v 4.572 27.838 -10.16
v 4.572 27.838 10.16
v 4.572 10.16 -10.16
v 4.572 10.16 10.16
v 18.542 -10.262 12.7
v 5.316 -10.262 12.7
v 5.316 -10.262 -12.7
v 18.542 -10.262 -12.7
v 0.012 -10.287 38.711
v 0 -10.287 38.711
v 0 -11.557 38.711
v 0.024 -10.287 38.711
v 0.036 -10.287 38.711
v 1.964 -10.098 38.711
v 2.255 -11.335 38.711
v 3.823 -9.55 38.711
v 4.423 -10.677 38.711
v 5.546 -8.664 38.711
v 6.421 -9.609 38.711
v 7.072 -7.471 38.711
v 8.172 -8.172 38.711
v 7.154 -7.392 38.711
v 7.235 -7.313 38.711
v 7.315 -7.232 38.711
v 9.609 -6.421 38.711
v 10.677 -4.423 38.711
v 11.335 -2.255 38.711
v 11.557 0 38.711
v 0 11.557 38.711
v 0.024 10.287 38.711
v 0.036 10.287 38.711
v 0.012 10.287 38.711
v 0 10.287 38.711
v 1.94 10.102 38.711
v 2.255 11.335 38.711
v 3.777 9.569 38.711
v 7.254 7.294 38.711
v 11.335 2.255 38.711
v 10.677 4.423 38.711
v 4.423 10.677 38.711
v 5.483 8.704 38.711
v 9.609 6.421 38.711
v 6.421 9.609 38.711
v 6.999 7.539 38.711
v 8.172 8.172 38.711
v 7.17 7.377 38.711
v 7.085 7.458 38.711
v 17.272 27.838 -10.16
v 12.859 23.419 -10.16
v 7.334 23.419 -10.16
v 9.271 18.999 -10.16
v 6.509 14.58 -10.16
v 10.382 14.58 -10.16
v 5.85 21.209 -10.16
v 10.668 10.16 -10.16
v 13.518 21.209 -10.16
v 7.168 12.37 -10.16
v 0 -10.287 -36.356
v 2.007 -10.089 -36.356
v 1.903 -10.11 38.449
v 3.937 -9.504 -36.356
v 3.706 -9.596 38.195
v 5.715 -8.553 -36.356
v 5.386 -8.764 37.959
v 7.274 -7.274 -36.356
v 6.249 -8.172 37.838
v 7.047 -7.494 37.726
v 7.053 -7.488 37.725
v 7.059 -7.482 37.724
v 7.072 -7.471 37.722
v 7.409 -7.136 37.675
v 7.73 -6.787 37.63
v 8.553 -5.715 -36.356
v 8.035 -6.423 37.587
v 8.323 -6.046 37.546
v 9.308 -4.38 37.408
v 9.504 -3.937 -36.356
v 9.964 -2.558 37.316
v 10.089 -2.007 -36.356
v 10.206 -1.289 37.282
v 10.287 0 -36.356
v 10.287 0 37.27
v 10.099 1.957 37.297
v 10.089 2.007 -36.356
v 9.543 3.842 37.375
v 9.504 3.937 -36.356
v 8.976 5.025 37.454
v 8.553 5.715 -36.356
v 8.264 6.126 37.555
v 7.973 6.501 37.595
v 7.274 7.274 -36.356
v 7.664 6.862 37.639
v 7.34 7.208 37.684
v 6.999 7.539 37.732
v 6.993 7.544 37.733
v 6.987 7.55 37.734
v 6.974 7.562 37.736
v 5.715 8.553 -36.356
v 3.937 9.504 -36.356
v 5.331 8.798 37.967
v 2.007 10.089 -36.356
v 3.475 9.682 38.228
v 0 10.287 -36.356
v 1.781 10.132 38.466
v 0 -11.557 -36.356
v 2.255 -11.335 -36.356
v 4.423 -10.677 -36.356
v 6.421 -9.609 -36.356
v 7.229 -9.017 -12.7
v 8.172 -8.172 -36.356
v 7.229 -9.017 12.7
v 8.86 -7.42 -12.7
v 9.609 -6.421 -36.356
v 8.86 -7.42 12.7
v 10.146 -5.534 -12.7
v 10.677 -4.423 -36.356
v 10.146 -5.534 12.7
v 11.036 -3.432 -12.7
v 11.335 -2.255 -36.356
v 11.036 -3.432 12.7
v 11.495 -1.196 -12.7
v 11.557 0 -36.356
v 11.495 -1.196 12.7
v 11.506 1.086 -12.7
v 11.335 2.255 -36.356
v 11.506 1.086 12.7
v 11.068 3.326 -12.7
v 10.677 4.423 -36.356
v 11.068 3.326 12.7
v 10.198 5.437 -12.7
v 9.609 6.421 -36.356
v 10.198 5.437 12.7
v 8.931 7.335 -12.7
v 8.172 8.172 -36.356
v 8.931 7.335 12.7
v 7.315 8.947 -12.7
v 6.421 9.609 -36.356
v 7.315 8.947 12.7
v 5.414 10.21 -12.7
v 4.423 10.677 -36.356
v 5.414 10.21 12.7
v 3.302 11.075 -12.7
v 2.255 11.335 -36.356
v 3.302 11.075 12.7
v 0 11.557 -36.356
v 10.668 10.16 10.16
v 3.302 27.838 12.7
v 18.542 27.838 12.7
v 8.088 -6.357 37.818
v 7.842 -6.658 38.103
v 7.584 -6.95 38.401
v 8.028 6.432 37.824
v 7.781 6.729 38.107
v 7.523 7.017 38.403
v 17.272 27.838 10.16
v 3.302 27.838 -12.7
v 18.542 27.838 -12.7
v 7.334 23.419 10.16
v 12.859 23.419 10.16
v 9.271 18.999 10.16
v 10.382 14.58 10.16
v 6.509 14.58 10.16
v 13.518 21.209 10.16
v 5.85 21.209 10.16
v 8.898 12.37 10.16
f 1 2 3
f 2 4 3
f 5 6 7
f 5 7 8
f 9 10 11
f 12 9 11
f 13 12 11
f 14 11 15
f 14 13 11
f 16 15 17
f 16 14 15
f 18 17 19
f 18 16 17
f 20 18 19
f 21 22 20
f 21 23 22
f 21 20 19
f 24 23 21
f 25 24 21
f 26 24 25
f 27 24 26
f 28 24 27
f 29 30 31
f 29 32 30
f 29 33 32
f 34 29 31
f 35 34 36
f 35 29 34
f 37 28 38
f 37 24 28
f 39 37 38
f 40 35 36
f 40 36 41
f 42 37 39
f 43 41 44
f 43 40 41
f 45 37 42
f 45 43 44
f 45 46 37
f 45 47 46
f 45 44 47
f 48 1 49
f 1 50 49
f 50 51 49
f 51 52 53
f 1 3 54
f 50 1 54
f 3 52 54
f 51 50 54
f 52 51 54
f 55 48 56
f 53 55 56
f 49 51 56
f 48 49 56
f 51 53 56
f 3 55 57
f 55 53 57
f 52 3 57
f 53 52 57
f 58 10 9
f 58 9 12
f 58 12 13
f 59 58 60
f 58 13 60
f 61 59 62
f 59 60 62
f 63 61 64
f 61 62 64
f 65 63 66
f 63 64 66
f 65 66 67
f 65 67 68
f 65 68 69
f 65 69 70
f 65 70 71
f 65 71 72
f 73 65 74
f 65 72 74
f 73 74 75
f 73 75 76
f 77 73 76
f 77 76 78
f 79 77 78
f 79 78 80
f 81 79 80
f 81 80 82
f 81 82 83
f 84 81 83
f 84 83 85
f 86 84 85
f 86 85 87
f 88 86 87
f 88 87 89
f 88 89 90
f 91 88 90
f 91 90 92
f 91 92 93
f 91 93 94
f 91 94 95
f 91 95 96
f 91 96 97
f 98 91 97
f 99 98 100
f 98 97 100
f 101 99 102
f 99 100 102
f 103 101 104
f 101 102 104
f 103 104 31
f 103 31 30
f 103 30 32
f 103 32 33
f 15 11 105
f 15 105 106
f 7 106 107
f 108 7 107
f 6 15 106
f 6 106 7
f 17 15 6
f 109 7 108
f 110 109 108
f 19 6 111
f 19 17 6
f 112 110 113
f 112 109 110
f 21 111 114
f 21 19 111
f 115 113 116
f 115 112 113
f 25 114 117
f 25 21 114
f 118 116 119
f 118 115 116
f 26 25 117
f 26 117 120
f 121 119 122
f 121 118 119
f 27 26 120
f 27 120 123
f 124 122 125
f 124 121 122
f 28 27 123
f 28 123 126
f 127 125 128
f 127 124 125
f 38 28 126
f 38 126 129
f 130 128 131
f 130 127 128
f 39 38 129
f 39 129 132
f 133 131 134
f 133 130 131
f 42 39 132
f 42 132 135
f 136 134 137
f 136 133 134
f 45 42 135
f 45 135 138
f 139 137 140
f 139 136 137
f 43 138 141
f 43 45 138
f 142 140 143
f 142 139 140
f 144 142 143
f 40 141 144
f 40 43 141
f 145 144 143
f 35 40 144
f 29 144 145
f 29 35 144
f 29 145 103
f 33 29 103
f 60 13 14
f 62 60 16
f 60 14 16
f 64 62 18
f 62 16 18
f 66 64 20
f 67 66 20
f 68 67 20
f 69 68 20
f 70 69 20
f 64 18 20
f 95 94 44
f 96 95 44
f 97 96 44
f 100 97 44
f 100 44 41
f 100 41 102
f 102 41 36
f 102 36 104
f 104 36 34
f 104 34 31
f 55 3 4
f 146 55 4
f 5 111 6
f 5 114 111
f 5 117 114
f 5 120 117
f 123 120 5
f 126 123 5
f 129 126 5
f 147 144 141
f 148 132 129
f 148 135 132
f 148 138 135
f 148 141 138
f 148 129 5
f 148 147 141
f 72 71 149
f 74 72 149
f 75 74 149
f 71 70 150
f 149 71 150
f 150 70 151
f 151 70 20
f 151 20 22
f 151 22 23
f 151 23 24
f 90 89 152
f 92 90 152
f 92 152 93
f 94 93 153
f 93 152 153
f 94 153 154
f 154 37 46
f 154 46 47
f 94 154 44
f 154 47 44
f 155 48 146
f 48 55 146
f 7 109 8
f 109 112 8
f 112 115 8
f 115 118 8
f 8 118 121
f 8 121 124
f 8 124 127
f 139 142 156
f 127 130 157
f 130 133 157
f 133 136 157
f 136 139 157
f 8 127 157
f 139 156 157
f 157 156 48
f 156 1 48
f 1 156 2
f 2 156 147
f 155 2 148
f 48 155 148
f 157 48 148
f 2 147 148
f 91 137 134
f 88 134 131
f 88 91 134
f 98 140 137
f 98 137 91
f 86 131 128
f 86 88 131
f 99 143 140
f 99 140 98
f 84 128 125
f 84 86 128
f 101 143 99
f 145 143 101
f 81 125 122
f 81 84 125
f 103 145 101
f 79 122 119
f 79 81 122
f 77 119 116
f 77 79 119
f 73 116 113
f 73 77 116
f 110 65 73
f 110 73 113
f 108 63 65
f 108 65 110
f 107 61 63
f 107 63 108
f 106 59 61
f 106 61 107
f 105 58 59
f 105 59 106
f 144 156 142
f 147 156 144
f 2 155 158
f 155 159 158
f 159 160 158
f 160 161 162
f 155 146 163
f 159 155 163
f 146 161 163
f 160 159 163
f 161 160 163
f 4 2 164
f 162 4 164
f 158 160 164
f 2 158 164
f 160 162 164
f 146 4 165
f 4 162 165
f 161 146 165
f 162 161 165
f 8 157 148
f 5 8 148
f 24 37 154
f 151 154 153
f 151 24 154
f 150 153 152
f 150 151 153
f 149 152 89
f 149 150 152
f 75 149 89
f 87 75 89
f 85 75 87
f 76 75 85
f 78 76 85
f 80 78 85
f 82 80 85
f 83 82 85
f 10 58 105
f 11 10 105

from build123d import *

# Parameters (mm, degrees)
F1_DEPTH     = 37.95141
F3_DEPTH     = 0.75946
F4_T4_DEPTH  = 76.9415838332
F4_S5_R      = 10.287
F4_T6_DEPTH  = 40
F5_W         = 23.114
F5_H         = 1.59512
F6_DEPTH     = 25.4
F9_DEPTH     = 25.4
F10_T4_DEPTH = 21.5531370707
F10_S5_R     = 10.287
F10_T6_DEPTH = 12
F14_W        = 15.24
F14_H        = 25.4
F14_W_2      = 12.7
F14_H_2      = 20.32
F15_DEPTH    = 38.1
F12_W        = 6.096
F12_H        = 20.32
F17_DEPTH    = 25.4


# Not quite as in the source:
# - a fillet or chamfer that OpenCascade refuses, or shapes differently, is made with other operations: its cross-section is extruded or revolved along the edge and cut away or added


with BuildPart() as f1:
    # F0 (on Top) → F1 (new body, symmetric)
    with BuildSketch(Plane.XY):
        with BuildLine():
            ThreePointArc((0, 10.287), (10.287, 0), (0, -10.287))
            Line((0, -10.287), (0, -11.557))
            ThreePointArc((0, -11.557), (11.557, 0), (0, 11.557))
            Line((0, 11.557), (0, 10.287))
        make_face()
    extrude(amount=F1_DEPTH, both=True)

    # F2 (on face) → F3 (join, symmetric)
    with BuildSketch(Plane.XY.offset(37.95141)):
        with BuildLine():
            Line((0, 11.557), (0, -11.557))
            ThreePointArc((0, -11.557), (11.557, 0), (0, 11.557))
        make_face()
    extrude(amount=F3_DEPTH, both=True)

    # F4: chamfer of 1.524 x 10.8438234569 on 1 edges, made by hand


with BuildPart() as f4_tool2:
    # F4_s3 → F4_t4 (new body)
    with BuildSketch(Plane.XZ.offset(-38.4707919166)):
        Polygon((0, 38.71595), (10.8438234569, 37.19195), (0, 37.19195), align=None)
    extrude(amount=F4_T4_DEPTH)

    # F4_s5 → F4_t6 (intersect, symmetric)
    with BuildSketch(Plane.XY.offset(38)):
        Circle(F4_S5_R)
    extrude(amount=F4_T6_DEPTH, both=True, mode=Mode.INTERSECT)


with BuildPart() as f1_1:
    add(f1.part)

    # F4_t1: cut F4_tool2
    add(f4_tool2.part, mode=Mode.SUBTRACT)

    # F5 (on face) → F6 (cut)
    with BuildSketch(Plane(origin=(0, 0, 0), x_dir=(0, -1, 0), z_dir=(-1, 0, 0))):
        with Locations((0, -37.15385)):
            Rectangle(F5_W, F5_H)
    extrude(amount=-F6_DEPTH, mode=Mode.SUBTRACT)

    # F8 (on face) → F9 (cut)
    with BuildSketch(Plane.XY.offset(38.71087)):
        with BuildLine():
            Line((7.0719993682, -7.4705551291), (6.9994361845, 7.5385848871))
            ThreePointArc((6.9994361845, 7.5385848871), (3.7766669941, 9.5686548384), (0.0361460782, 10.2869364954))
            Line((0.0361460782, 10.2869364954), (0.0361460782, -10.2869364954))
            ThreePointArc((0.0361460782, -10.2869364954), (3.8228829333, -9.5502845548), (7.0719993682, -7.4705551291))
        make_face()
    extrude(amount=-F9_DEPTH, mode=Mode.SUBTRACT)

    # F10: chamfer of 1.27 on 1 edges, made by hand


with BuildPart() as f10_tool2:
    # F10_s3 → F10_t4 (new body)
    with BuildSketch(Plane(origin=(0.0519758467, -10.7508066832, -0.0073047289), x_dir=(-0.9999883135, -0.0048345432, 0), z_dir=(-0.0048345421, 0.9999880827, 0.0006794506))):
        with BuildLine():
            Line((-7.0024721698, 39.0354748619), (-8.3267685678, 37.5120486506))
            Line((-8.3267685678, 37.5120486506), (-8.3232336123, 37.4868958359))
            ThreePointArc((-8.3232336123, 37.4868958359), (-7.6800684701, 37.6109410786), (-7.0322650445, 37.7019828278))
            Line((-7.0322650445, 37.7019828278), (-7.0104, 37.7271356426))
            ThreePointArc((-7.0104, 37.7271356426), (-7.0104, 38.3813052522), (-6.9770721698, 39.0354748619))
            Line((-6.9770721698, 39.0354748619), (-7.0024721698, 39.0354748619))
        make_face()
    extrude(amount=F10_T4_DEPTH)

    # F10_s5 → F10_t6 (intersect, symmetric)
    with BuildSketch(Plane.XY.offset(38.3)):
        Circle(F10_S5_R)
    extrude(amount=F10_T6_DEPTH, both=True, mode=Mode.INTERSECT)


with BuildPart() as f1_2:
    add(f1_1.part)

    # F10_t1: cut F10_tool2
    add(f10_tool2.part, mode=Mode.SUBTRACT)

    # F14 (on offset) → F15 (join)
    with BuildSketch(Plane.XZ.offset(-27.8384)):
        with Locations((10.922, 0)):
            Rectangle(F14_W, F14_H)
        with Locations((10.922, 0)):
            Rectangle(F14_W_2, F14_H_2, mode=Mode.SUBTRACT)
        with Locations((10.922, 0)):
            Rectangle(F14_W_2, F14_H_2)
    extrude(amount=F15_DEPTH)

    # F14 (on offset) → F16 section 0
    with BuildSketch(Plane.XZ.offset(-27.8384)):
        with Locations((10.922, 0)):
            Rectangle(F14_W_2, F14_H_2)
    # F12 (on offset) → F16 section 1
    with BuildSketch(Plane.XZ.offset(-10.16)):
        with Locations((7.62, 0)):
            Rectangle(F12_W, F12_H)
    loft(mode=Mode.SUBTRACT)

    # F17 (cut): a face of the model
    f17_faces = [f1_2.faces().sort_by_distance(p)[0] for p in [
        (6.1976073011, 0, -12.7),
    ]]
    extrude(f17_faces, amount=-F17_DEPTH, mode=Mode.SUBTRACT)


solid = f1_2.part
